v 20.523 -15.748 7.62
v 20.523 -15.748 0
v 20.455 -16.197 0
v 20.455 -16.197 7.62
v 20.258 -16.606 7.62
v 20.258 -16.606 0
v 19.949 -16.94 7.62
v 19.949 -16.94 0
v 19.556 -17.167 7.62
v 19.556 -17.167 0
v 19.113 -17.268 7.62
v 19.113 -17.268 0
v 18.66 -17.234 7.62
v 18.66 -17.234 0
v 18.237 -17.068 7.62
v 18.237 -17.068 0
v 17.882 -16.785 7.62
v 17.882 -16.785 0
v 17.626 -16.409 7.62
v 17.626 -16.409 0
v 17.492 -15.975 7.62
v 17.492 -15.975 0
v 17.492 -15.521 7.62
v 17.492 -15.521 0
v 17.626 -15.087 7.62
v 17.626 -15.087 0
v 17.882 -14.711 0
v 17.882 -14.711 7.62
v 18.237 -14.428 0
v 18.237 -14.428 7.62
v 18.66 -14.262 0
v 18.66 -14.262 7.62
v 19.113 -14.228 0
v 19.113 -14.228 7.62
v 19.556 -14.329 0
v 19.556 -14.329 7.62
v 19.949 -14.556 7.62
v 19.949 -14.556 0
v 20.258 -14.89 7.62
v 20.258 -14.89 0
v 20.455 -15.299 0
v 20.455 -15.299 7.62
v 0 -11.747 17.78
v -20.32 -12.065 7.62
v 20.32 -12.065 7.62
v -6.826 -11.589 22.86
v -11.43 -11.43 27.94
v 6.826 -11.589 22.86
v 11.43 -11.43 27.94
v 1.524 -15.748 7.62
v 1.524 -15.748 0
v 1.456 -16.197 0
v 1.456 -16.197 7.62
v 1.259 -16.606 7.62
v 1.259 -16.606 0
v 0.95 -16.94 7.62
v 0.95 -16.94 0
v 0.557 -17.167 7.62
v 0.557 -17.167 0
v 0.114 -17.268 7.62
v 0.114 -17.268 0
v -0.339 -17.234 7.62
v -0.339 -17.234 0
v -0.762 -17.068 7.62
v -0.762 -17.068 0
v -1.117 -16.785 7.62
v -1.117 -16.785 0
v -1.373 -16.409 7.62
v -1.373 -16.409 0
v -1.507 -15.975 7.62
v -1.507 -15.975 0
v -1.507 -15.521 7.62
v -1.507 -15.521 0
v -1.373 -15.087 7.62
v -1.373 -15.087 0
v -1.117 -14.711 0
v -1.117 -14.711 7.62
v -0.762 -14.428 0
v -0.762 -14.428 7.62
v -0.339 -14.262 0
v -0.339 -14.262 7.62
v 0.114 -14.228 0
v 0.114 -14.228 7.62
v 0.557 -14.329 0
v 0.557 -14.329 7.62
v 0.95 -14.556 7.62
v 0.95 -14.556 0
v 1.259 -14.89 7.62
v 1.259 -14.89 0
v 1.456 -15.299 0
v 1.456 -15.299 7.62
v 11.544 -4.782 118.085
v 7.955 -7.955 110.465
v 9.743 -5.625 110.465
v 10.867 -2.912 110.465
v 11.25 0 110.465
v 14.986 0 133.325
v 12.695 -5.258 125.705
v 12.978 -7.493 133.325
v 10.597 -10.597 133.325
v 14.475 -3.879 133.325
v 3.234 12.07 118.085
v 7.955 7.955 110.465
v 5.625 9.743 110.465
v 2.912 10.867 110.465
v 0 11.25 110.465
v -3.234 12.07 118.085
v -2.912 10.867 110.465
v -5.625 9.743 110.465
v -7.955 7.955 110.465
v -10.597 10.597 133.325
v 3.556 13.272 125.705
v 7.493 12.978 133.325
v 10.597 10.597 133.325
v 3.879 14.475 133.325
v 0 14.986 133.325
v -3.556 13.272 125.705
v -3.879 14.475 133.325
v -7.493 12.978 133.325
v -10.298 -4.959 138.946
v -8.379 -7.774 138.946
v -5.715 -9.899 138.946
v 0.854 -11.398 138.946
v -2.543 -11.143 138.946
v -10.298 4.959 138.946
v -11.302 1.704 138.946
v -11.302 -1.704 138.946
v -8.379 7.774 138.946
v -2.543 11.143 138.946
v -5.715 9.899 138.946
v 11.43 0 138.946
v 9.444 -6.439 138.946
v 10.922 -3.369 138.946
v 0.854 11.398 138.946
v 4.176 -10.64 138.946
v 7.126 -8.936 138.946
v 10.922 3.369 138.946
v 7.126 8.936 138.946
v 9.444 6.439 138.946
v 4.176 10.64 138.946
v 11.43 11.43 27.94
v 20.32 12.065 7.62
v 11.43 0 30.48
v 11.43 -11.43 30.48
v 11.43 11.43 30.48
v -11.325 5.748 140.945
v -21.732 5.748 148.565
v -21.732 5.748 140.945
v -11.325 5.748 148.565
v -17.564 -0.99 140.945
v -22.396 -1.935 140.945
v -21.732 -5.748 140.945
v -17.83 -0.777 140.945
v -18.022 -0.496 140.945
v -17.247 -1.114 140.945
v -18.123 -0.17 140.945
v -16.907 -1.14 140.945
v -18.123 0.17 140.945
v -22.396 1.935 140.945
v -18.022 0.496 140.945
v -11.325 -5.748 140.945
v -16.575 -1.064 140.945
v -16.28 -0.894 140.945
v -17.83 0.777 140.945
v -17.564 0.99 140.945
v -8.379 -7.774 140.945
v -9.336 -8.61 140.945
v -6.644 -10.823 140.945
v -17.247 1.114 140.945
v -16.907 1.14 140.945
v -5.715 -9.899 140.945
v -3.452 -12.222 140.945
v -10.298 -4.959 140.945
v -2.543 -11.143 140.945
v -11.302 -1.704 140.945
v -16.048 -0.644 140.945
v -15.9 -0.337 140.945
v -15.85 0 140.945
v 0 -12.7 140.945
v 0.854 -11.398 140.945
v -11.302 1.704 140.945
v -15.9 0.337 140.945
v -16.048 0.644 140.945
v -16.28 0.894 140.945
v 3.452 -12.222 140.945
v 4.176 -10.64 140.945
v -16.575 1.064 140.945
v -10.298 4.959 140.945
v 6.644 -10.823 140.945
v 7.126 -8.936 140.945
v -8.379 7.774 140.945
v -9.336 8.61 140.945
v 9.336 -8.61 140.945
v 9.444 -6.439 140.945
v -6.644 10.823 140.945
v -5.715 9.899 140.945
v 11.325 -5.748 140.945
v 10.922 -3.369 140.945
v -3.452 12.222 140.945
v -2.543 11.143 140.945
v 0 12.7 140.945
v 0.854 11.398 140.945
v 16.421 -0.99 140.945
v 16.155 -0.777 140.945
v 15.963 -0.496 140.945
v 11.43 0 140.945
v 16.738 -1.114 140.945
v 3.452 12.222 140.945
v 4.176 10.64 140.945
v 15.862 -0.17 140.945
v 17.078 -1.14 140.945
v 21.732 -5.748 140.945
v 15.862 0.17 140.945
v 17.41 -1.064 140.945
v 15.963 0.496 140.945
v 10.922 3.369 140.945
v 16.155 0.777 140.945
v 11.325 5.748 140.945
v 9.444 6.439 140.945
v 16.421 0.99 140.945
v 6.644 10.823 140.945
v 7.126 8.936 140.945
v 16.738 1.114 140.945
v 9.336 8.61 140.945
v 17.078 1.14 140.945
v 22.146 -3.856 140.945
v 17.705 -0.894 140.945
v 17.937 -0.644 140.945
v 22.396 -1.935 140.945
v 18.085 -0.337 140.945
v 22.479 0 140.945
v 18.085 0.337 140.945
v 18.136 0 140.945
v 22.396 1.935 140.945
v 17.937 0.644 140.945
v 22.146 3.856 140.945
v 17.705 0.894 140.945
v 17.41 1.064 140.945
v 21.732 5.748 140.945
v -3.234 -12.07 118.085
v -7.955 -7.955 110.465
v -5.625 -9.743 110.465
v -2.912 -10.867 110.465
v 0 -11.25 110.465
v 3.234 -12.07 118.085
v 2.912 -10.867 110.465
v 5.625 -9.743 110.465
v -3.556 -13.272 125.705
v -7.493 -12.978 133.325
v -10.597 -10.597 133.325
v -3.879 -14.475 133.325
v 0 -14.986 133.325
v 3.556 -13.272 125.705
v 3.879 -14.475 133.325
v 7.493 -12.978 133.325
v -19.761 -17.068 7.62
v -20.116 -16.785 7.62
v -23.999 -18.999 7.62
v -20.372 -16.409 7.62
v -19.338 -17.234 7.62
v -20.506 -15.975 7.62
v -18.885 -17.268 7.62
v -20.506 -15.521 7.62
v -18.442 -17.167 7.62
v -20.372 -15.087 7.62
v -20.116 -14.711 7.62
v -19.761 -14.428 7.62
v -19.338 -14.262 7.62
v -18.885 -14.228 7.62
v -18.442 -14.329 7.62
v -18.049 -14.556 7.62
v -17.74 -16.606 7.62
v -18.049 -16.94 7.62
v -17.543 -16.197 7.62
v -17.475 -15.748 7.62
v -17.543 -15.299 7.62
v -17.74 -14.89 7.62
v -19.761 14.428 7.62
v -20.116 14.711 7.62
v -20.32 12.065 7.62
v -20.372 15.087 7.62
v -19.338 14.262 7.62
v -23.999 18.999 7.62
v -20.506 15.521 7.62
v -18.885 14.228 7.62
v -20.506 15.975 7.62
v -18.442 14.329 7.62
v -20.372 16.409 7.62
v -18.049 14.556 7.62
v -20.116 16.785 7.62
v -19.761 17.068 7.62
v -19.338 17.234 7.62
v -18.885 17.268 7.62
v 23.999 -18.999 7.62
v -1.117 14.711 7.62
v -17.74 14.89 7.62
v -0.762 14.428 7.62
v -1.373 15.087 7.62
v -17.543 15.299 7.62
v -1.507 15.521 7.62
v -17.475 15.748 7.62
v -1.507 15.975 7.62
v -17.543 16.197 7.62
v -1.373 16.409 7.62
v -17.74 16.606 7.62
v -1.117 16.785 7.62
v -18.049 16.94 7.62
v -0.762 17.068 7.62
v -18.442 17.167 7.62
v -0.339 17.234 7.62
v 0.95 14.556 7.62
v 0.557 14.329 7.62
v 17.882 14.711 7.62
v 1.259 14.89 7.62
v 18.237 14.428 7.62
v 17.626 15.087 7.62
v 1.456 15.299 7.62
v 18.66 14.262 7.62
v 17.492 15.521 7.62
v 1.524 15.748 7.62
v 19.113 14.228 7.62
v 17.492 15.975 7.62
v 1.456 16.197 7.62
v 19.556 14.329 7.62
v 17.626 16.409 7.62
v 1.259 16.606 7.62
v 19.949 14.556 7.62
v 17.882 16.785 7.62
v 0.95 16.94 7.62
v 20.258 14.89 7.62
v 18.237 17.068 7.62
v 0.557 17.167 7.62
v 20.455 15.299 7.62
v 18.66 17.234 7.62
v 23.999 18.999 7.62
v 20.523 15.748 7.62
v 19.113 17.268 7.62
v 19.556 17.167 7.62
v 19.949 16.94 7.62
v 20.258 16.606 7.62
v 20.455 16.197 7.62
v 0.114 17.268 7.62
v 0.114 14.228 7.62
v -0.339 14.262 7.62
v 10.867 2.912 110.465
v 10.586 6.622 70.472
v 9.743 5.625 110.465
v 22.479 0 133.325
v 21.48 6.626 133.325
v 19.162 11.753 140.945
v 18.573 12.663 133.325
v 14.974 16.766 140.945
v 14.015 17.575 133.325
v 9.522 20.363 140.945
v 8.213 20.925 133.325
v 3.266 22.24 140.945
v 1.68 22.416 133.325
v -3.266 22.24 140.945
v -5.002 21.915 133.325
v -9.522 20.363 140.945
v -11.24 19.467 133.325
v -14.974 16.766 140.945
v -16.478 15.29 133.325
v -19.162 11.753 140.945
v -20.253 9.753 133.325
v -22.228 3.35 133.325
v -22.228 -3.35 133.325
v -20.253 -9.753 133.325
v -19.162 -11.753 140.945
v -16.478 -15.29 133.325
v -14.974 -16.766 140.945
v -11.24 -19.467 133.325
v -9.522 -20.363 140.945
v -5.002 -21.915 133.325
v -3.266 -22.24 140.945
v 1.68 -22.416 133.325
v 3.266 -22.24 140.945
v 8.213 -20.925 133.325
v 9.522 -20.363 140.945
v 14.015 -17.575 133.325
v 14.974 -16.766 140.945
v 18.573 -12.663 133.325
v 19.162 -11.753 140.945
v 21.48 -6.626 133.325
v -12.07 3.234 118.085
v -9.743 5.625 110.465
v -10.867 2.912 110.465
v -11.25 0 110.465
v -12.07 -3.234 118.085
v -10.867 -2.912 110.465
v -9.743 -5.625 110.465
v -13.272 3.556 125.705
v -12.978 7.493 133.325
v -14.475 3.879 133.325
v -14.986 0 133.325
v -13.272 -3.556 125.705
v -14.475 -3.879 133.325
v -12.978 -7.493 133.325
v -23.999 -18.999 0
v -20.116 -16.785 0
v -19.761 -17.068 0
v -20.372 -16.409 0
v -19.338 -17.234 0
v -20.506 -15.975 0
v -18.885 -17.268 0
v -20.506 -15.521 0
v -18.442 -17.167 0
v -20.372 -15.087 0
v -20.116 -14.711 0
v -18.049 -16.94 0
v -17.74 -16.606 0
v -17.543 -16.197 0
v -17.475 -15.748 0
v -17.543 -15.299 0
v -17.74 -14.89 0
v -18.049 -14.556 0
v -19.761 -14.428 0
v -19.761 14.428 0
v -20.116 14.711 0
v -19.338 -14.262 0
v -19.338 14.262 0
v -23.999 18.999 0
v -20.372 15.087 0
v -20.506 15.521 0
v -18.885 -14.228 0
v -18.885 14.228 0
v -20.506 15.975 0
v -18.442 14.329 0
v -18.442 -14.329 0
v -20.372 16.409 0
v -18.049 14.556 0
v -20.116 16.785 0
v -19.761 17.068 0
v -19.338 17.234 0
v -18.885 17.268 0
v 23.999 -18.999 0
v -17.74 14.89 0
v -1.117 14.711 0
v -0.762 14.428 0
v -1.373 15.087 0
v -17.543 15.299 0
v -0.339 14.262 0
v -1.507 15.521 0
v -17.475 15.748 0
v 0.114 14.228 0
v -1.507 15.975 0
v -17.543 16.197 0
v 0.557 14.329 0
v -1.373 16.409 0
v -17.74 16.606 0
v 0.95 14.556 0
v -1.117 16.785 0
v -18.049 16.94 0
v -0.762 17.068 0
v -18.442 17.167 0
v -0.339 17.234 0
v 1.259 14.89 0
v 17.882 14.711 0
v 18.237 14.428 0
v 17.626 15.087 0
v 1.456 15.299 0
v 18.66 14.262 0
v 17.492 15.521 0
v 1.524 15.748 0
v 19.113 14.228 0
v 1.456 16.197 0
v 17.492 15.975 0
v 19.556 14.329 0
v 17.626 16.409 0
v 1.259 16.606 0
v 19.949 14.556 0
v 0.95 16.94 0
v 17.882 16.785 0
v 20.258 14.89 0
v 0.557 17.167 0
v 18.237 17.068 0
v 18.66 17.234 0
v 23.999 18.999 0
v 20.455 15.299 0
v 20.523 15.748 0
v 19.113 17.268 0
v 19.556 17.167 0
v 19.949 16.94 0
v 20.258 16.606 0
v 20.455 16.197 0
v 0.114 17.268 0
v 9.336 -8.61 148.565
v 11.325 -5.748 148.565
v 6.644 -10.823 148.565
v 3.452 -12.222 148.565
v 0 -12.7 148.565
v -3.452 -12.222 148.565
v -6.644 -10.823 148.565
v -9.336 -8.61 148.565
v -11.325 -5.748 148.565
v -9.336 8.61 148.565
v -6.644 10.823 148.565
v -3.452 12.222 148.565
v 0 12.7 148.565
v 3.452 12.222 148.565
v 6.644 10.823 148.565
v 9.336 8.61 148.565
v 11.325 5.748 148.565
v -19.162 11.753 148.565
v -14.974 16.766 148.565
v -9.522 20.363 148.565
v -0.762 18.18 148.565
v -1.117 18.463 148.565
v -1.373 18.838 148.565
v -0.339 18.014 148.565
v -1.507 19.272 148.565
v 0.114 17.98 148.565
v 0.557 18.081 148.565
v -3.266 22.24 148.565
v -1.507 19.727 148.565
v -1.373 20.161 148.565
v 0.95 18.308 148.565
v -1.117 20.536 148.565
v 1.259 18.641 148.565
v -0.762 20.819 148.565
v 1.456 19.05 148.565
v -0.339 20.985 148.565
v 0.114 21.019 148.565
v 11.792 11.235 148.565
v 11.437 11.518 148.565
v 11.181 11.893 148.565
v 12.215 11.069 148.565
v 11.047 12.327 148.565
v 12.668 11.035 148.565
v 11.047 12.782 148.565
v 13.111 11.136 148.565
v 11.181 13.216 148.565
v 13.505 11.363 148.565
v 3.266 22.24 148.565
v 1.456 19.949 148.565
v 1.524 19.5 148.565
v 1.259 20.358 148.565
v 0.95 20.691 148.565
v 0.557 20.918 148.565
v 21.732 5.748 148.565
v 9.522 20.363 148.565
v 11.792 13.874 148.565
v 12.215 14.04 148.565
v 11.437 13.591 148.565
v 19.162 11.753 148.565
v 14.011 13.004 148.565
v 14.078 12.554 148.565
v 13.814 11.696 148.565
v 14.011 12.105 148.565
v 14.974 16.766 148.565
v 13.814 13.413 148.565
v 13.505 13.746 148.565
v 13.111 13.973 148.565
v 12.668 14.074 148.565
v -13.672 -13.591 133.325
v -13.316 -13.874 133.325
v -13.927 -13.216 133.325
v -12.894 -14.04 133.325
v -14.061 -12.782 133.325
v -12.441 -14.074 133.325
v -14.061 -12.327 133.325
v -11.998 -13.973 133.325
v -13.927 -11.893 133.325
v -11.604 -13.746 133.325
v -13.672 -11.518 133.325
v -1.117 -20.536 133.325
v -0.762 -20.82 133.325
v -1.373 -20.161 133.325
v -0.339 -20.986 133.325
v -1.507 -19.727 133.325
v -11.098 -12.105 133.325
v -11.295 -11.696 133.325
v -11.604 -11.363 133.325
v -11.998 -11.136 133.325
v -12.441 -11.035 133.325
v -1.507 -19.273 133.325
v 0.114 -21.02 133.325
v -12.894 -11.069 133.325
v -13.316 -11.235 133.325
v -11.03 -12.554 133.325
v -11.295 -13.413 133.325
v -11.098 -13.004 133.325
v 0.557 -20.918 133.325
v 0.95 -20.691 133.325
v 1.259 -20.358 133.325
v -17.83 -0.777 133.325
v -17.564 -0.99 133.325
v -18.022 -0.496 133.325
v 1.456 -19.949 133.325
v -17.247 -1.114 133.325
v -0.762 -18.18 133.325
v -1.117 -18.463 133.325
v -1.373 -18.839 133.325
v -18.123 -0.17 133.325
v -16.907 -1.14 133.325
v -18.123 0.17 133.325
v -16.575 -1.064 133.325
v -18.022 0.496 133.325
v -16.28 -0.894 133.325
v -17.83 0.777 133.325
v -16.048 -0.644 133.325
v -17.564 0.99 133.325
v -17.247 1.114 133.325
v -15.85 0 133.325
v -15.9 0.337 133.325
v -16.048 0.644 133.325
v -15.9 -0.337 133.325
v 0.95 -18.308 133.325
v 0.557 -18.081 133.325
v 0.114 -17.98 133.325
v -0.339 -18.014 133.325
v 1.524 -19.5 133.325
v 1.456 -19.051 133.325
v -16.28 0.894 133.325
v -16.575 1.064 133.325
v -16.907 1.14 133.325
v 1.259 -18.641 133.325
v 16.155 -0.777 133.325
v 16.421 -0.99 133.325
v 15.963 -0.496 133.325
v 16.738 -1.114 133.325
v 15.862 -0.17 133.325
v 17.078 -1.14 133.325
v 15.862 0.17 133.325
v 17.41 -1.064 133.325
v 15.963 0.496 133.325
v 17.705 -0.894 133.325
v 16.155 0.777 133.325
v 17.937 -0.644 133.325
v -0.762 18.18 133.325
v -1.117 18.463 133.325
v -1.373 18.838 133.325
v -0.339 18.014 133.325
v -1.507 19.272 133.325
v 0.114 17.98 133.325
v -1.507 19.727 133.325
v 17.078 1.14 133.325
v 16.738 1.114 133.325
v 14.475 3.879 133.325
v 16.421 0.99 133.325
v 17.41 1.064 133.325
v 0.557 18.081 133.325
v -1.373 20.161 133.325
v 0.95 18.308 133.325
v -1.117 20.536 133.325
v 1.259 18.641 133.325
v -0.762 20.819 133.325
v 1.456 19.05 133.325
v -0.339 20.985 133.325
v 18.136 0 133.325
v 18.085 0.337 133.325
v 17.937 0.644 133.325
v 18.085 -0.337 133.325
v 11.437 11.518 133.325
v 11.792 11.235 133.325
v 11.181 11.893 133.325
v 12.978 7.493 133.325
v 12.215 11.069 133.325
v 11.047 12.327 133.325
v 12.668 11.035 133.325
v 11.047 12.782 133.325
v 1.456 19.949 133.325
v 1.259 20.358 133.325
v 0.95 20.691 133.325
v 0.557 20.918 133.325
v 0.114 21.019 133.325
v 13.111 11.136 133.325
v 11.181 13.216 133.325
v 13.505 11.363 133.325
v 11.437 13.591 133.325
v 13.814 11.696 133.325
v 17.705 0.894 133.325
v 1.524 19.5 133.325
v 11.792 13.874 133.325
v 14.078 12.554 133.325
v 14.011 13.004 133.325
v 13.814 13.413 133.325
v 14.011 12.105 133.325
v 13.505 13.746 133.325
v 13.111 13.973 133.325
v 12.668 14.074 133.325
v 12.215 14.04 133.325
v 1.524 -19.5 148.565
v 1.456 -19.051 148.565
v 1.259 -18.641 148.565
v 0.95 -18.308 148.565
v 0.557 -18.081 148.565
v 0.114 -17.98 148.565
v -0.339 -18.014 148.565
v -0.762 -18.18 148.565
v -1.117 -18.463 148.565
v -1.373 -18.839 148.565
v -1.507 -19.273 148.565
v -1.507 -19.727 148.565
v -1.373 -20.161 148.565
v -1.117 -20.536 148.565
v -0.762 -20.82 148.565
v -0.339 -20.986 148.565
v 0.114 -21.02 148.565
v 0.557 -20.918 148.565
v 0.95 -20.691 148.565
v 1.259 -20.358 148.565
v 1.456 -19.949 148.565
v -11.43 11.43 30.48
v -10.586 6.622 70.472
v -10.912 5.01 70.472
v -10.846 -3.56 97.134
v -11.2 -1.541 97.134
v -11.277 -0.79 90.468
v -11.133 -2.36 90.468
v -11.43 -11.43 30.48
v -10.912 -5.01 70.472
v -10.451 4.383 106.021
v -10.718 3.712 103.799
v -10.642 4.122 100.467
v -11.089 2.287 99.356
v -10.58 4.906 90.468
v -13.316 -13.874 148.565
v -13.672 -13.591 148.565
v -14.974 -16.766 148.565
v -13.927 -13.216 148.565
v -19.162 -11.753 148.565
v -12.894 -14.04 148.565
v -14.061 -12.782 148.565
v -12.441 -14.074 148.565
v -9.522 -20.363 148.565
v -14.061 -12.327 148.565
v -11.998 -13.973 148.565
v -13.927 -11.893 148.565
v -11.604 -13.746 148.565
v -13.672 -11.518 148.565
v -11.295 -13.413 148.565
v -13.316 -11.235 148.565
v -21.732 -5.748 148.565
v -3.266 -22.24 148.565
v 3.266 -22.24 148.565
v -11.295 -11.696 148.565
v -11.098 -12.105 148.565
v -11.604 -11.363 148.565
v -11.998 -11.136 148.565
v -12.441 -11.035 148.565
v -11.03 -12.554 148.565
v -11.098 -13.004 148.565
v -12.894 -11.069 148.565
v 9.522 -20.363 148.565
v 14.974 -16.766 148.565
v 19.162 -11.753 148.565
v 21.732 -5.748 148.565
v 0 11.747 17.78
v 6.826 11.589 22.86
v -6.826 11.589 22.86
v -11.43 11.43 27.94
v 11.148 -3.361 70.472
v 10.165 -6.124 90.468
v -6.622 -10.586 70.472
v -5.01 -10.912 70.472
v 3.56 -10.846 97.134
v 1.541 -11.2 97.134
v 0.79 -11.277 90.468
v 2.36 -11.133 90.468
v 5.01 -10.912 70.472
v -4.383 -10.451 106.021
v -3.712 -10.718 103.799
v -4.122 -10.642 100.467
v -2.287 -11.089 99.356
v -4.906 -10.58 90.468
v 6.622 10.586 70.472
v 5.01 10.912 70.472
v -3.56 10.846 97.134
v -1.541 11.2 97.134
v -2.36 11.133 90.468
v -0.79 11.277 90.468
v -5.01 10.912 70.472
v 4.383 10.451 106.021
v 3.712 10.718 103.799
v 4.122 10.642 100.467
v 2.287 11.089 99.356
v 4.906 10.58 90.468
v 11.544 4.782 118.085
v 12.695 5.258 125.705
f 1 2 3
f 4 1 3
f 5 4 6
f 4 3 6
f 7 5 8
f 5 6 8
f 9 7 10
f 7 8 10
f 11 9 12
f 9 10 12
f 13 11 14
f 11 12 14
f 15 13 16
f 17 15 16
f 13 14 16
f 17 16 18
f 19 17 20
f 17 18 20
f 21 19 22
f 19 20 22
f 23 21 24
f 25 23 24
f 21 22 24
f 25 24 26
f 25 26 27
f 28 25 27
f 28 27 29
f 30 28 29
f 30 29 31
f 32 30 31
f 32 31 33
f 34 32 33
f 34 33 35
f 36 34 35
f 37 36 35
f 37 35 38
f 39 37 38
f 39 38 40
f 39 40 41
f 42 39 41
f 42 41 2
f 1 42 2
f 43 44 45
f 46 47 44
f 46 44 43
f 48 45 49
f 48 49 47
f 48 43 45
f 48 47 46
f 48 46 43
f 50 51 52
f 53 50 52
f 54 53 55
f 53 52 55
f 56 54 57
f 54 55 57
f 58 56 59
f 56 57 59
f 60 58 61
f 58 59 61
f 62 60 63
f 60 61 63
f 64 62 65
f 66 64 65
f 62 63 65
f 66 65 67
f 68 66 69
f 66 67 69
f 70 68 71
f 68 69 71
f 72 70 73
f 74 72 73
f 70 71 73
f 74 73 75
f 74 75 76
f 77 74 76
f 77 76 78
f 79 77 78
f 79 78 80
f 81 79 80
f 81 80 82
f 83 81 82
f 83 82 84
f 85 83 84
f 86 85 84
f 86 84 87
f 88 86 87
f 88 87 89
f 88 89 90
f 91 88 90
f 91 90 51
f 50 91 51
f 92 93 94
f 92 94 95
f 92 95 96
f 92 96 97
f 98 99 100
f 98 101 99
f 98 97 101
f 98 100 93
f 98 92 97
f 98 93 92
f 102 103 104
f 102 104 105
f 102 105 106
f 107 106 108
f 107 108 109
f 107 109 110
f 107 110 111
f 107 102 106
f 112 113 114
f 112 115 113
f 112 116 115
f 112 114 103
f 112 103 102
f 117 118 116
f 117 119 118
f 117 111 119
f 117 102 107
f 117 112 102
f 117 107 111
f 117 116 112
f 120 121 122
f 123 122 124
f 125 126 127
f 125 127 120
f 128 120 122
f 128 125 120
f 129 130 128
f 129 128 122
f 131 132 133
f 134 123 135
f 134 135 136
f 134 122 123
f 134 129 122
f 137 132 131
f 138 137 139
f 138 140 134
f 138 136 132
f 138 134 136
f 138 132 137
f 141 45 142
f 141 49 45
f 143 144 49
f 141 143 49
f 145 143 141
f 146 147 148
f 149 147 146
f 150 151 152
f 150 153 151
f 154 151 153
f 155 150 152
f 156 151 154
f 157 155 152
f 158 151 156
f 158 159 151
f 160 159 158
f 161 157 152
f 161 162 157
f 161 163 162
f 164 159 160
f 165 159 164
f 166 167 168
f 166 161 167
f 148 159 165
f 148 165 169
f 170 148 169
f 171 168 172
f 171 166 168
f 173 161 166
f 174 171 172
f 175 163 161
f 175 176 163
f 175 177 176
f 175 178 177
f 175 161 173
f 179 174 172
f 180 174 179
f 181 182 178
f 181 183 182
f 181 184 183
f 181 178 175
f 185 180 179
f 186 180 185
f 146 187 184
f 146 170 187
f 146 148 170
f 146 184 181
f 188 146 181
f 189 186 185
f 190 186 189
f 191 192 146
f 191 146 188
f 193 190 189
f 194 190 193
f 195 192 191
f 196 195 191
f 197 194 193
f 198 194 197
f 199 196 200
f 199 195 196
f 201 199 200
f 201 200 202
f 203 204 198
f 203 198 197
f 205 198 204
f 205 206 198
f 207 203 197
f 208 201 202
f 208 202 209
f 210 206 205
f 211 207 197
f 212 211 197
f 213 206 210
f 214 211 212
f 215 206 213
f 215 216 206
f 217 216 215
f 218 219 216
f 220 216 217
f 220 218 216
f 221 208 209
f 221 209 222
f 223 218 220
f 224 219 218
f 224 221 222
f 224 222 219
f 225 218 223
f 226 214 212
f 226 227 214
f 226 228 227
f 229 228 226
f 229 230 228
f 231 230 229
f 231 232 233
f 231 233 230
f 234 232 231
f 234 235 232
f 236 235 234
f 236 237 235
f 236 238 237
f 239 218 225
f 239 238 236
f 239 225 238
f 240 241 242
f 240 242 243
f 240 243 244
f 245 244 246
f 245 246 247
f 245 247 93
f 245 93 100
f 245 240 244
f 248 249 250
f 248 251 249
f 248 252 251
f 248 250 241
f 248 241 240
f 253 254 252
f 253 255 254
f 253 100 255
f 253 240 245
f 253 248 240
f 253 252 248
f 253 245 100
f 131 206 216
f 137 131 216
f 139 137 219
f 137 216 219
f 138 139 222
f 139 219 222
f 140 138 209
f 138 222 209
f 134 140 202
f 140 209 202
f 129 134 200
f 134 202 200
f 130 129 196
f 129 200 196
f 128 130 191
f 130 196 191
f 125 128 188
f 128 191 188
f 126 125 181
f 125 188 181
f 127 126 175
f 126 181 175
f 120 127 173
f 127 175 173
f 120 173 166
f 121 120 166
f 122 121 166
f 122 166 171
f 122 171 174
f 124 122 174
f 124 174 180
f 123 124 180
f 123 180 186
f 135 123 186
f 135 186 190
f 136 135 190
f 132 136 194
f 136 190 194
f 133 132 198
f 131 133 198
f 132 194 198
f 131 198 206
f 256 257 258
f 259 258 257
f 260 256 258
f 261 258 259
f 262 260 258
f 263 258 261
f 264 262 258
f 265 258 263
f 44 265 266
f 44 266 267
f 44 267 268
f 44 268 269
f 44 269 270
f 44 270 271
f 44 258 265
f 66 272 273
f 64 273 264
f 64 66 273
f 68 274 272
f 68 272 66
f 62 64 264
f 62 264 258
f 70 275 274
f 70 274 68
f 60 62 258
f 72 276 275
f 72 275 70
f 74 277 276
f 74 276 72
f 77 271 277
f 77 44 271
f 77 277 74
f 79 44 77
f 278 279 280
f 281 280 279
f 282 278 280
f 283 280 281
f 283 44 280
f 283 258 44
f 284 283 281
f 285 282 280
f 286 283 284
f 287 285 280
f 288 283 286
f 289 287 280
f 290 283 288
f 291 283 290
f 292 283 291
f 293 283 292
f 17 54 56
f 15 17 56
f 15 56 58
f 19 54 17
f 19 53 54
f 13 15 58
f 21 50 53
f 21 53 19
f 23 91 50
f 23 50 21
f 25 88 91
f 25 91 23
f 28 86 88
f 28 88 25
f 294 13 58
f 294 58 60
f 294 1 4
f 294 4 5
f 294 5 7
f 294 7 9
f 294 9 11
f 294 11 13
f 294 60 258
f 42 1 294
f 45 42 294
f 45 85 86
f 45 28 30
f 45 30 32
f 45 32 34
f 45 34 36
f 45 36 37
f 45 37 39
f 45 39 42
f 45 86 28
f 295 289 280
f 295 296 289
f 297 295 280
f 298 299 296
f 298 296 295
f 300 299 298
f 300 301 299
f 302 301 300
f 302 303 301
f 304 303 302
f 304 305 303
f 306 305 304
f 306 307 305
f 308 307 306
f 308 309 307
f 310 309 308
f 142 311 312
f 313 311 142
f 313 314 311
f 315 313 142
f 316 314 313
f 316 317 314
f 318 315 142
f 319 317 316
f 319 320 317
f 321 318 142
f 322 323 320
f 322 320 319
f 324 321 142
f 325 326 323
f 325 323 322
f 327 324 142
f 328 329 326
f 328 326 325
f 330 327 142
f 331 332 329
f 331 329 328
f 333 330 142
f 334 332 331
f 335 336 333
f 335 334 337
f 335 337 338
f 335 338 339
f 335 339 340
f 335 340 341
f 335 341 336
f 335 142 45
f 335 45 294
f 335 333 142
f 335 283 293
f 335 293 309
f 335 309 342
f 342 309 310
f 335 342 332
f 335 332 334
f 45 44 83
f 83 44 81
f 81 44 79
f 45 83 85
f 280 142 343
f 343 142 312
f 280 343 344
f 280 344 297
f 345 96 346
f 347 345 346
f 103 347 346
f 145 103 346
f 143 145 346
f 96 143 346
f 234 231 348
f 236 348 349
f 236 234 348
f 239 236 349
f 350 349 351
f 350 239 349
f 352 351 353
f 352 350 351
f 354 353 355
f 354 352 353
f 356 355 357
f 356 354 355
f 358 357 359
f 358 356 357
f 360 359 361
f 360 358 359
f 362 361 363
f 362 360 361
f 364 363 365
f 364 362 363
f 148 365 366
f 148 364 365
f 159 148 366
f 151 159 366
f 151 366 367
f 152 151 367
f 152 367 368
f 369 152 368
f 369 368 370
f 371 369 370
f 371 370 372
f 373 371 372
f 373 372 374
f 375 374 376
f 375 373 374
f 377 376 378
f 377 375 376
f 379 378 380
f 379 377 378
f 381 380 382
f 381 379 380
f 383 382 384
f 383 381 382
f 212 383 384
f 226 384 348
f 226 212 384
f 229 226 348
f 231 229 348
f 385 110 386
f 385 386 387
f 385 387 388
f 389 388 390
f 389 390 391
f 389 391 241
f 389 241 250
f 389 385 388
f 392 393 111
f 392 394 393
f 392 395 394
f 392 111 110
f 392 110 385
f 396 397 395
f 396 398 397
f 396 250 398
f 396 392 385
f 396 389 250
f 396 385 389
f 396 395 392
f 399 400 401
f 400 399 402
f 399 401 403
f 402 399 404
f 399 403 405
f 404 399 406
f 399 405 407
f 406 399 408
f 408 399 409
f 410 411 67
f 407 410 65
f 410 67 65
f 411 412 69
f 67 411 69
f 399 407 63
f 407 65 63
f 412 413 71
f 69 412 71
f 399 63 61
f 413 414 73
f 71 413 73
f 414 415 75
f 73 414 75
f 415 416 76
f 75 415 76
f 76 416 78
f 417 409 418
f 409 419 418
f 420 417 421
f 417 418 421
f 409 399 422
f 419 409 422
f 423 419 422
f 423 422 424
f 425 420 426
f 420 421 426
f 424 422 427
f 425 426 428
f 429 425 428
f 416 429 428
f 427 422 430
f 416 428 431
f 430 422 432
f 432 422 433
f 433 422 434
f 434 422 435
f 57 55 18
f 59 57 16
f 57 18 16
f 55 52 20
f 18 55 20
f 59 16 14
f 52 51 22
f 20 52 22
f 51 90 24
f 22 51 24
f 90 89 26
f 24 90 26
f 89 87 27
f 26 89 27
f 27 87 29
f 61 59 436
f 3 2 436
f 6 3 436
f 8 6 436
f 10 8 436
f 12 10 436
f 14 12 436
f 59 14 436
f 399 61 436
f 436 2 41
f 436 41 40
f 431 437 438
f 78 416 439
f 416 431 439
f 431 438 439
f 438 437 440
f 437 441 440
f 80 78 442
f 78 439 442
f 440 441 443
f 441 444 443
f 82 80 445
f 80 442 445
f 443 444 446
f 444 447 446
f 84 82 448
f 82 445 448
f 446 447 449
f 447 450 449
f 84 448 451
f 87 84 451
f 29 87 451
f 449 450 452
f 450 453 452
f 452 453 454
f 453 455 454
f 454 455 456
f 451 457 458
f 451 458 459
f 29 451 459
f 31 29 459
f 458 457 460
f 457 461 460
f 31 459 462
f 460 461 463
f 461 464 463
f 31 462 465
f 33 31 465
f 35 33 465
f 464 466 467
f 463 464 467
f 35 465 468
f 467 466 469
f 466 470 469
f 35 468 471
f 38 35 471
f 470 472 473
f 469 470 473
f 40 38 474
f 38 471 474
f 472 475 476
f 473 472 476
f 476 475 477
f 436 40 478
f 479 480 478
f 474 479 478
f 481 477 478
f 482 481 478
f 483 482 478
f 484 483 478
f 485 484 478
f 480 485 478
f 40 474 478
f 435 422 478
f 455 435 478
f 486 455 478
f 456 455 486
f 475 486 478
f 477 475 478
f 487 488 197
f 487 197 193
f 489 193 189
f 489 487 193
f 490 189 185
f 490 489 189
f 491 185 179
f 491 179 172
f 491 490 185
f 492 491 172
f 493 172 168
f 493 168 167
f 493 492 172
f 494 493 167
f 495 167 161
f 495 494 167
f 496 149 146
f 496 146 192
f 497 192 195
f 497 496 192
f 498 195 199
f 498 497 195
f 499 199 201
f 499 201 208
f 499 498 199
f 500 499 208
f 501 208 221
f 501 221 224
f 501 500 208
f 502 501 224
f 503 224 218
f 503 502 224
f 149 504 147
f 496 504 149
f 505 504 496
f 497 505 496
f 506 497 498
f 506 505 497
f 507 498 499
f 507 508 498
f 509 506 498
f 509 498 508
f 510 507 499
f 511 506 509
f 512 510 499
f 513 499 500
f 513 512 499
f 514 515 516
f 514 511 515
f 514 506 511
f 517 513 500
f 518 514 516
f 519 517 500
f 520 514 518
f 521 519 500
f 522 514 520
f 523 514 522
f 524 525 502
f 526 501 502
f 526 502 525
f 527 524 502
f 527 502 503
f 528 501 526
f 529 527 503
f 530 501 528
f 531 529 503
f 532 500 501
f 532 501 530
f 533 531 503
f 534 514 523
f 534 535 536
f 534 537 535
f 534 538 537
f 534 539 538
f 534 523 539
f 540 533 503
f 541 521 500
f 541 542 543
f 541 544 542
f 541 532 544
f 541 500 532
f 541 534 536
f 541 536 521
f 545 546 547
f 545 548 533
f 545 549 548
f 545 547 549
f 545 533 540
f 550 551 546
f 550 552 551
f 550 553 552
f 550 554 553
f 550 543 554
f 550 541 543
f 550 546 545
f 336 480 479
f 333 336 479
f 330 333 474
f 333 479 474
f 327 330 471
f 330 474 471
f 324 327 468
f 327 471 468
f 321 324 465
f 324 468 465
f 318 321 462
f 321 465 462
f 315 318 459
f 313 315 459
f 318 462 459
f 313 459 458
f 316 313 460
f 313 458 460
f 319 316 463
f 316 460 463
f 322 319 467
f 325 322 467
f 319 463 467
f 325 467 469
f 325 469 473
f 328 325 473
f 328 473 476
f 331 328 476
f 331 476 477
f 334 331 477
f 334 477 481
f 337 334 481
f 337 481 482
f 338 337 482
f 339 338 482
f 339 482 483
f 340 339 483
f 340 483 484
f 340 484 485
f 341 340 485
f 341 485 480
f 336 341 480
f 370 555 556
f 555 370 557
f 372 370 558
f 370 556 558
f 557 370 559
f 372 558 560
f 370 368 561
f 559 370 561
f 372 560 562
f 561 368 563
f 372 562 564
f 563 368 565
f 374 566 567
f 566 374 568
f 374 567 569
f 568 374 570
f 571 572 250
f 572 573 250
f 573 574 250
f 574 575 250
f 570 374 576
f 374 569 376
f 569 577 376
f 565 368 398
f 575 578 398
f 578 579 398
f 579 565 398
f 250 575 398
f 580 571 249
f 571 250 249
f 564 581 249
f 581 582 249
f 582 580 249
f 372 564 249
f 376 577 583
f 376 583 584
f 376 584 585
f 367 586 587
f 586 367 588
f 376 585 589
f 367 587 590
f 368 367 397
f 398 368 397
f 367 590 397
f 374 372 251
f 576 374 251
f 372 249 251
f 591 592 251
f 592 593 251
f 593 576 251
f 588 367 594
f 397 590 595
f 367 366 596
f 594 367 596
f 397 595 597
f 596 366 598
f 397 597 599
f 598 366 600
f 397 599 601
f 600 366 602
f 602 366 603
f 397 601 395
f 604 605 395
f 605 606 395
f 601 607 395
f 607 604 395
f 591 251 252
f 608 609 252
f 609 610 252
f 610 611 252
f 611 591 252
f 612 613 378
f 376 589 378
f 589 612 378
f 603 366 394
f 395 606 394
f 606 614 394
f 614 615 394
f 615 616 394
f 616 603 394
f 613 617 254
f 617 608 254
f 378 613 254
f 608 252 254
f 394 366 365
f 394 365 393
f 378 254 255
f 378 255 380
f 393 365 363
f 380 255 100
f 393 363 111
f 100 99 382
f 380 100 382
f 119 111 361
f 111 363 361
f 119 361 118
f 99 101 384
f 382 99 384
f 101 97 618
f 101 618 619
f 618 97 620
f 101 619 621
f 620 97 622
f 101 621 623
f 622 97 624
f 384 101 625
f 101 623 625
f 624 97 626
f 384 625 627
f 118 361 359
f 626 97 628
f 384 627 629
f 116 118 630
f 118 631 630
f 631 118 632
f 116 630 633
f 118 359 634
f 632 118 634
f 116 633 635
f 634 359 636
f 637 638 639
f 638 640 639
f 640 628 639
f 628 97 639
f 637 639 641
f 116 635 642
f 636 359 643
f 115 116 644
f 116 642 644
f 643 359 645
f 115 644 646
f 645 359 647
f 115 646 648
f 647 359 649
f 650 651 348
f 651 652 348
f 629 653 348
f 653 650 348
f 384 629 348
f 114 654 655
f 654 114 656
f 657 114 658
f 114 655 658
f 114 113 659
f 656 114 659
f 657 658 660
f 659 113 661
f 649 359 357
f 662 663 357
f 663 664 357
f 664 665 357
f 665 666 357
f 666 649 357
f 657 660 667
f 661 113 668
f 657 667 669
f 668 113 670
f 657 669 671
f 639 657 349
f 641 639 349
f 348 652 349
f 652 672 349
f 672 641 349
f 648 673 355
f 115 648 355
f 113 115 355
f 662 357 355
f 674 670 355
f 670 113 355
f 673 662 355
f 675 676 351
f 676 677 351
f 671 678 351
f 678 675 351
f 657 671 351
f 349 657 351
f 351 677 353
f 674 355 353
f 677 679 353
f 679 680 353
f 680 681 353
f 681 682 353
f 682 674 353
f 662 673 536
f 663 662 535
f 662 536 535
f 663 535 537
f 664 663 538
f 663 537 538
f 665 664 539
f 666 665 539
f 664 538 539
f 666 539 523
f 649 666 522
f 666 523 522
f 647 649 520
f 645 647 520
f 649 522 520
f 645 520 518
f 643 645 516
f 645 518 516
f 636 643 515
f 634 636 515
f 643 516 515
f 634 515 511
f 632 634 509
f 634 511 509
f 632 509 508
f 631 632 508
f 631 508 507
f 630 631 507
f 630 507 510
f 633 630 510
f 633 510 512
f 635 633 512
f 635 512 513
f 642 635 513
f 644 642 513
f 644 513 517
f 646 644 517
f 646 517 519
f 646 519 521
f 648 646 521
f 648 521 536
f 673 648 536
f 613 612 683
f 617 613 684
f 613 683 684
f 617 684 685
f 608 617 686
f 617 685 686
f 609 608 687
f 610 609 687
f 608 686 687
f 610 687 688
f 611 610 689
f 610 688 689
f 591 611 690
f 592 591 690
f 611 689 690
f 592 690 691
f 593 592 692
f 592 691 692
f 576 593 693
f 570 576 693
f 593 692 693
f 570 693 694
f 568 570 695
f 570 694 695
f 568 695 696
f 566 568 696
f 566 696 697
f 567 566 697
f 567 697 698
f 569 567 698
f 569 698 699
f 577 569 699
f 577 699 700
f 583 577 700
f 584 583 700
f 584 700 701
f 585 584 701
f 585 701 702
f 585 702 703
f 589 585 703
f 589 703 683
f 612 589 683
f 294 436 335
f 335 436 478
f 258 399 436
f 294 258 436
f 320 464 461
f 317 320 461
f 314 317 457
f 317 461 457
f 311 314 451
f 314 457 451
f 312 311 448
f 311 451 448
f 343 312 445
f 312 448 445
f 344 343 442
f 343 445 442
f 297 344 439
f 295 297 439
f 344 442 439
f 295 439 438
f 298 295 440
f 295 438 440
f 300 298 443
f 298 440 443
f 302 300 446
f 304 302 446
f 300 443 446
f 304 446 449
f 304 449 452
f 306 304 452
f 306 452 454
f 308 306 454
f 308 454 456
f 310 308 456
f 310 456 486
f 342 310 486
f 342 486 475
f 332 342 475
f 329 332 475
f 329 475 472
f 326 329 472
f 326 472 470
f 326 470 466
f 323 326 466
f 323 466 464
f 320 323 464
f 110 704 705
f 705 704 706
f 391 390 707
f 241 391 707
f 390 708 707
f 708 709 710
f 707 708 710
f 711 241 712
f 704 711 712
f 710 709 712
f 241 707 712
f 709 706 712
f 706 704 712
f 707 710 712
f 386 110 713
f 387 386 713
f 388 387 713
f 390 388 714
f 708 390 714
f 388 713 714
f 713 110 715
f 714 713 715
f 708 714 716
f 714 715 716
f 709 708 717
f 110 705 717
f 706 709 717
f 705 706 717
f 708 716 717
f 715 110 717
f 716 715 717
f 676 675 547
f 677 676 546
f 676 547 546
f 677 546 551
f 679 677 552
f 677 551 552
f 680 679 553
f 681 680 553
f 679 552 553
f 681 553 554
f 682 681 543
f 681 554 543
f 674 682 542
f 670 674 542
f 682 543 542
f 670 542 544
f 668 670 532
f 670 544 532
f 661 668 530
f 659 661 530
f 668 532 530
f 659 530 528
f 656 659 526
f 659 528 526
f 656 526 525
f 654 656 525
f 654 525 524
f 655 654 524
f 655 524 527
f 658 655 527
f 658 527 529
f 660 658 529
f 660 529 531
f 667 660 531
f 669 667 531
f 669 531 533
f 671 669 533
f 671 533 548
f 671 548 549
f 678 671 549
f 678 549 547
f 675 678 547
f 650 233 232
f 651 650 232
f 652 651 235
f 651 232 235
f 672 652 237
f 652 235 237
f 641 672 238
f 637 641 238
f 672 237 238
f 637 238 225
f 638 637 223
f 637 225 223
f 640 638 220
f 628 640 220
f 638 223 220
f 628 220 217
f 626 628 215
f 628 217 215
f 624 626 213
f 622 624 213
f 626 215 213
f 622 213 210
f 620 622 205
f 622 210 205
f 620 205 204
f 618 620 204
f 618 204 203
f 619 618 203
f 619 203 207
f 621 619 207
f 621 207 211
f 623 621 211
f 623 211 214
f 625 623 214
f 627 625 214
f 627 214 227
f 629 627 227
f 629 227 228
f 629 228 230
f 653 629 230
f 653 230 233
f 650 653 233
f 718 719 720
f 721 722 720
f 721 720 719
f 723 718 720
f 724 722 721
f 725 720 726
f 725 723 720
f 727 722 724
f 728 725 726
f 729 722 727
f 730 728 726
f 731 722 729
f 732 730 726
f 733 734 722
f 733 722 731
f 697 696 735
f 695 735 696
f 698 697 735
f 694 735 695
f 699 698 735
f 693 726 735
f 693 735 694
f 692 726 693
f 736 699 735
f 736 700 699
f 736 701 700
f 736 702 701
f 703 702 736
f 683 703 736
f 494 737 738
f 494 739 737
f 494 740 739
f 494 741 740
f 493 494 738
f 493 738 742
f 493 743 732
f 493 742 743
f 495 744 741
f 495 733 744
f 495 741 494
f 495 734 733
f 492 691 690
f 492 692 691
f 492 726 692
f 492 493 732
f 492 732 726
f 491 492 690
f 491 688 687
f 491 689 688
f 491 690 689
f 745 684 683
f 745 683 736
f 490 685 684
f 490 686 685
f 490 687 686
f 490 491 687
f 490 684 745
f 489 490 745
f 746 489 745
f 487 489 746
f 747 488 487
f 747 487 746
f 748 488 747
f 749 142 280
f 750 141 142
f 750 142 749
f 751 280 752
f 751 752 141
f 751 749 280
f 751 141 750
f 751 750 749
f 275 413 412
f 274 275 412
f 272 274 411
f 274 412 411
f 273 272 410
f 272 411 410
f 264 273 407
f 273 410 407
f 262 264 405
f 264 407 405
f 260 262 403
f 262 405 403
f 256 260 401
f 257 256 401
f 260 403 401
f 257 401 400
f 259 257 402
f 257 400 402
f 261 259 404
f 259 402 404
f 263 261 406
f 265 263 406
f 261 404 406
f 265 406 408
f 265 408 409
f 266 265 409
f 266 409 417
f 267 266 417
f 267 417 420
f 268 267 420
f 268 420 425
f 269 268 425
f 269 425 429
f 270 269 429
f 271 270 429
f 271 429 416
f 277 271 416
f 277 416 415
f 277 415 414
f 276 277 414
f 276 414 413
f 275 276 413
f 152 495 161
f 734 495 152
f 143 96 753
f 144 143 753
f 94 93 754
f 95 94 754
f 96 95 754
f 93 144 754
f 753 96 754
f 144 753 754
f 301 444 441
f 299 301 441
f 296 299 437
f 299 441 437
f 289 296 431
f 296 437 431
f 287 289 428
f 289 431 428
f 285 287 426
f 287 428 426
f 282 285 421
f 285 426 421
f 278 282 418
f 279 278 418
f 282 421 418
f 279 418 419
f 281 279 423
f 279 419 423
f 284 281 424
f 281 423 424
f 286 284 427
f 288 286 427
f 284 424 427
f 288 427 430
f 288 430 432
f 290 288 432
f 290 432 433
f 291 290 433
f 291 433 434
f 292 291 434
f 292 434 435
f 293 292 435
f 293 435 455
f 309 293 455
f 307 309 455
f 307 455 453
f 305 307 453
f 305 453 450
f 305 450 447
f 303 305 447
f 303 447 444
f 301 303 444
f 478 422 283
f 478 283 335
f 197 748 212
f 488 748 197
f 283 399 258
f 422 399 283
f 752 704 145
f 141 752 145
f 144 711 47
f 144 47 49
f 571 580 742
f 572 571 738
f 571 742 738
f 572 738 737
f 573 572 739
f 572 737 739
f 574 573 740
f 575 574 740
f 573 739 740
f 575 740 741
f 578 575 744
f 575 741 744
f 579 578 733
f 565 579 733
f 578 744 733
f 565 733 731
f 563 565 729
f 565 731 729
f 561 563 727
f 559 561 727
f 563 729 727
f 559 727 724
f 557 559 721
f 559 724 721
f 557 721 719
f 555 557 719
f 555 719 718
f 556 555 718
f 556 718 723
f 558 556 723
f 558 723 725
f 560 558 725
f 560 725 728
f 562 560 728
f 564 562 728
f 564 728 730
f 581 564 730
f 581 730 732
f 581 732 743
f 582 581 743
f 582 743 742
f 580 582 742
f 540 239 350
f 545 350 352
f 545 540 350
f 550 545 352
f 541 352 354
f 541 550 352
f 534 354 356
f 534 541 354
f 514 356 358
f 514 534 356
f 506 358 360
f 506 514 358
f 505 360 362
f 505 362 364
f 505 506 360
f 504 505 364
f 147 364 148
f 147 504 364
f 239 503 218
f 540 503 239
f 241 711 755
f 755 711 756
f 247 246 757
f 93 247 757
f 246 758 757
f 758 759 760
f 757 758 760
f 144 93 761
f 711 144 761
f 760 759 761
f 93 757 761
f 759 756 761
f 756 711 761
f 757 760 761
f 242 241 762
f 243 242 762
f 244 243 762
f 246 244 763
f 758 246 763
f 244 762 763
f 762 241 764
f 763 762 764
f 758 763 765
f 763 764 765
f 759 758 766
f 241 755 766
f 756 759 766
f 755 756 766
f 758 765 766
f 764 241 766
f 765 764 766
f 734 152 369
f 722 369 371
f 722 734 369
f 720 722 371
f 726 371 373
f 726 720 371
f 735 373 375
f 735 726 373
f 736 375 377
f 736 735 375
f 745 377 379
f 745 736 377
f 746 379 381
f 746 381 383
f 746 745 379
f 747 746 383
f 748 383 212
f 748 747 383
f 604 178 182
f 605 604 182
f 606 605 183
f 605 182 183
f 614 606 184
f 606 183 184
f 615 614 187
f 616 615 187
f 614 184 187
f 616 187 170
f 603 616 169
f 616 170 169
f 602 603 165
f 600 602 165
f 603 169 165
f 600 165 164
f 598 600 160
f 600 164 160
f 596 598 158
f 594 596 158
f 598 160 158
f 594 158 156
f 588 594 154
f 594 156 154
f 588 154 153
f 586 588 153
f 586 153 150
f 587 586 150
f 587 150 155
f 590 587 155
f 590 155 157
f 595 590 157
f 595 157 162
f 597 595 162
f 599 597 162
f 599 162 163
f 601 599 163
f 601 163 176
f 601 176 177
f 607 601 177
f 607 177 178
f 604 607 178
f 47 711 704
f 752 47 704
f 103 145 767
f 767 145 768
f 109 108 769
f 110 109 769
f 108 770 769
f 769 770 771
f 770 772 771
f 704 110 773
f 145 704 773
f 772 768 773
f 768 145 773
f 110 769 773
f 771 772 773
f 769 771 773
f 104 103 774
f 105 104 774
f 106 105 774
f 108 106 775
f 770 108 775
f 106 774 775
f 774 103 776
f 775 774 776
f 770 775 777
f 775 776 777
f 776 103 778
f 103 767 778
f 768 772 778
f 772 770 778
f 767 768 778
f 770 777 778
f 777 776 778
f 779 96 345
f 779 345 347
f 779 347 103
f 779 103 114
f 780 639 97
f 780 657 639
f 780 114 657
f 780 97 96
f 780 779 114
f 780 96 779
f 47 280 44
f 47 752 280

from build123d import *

# Parameters (mm, degrees)
F2_W        = 22.86
F2_H        = 22.86
F2_R        = 11.24966
F11_DEPTH   = 2.54
F6_W        = 40.64
F6_H        = 24.13
F11_FACE_W  = 22.86
F11_FACE_H  = 22.86
F4_R        = 11.249914
F11_FACE1_W = 22.86
F11_FACE1_H = 22.86
F0_W        = 47.99838
F0_H        = 37.9984
F14_DEPTH   = 7.62
F16_R       = 14.986
F10_R       = 22.479
F10_R_2     = 14.986
F18_DEPTH   = 7.62
F19_DEPTH   = 7.62
F21_R       = 1.524
F22_DEPTH   = 25.4
F23_R       = 1.524
F24_DEPTH   = 25.4
F20_R       = 1.143
F25_DEPTH   = 25.4
F26_R       = 11.43
F27_DEPTH   = 1.99898


with BuildPart() as f11:
    # F2 (on offset) → F11 (new body)
    with BuildSketch(Plane.XY.offset(30.48)):
        Rectangle(F2_W, F2_H)
        Circle(F2_R, mode=Mode.SUBTRACT)
        Circle(F2_R)
    extrude(amount=-F11_DEPTH)

    # F6 (on offset) → F12 section 0
    with BuildSketch(Plane.XY.offset(7.62)):
        Rectangle(F6_W, F6_H)
    # F11_face (on face) → F12 section 1
    with BuildSketch(Plane(origin=(0, 0, 27.94), x_dir=(1, 0, 0), z_dir=(0, 0, -1))):
        Rectangle(F11_FACE_W, F11_FACE_H)
    loft()

    # F4 (on offset) → F13 section 0
    with BuildSketch(Plane.XY.offset(110.4646)):
        Circle(F4_R)
    # F11_face1 (on face) → F13 section 1
    with BuildSketch(Plane.XY.offset(30.48)):
        Rectangle(F11_FACE1_W, F11_FACE1_H)
    loft()

    # F0 (on Top) → F14 (join, through all)
    with BuildSketch(Plane.XY):
        Rectangle(F0_W, F0_H)
    extrude(amount=F14_DEPTH)

    # F13_face (on face) → F17 section 0
    with BuildSketch(Plane.XY.offset(110.4646)):
        with BuildLine():
            ThreePointArc((11.249914, 0), (10.3935652871, 4.3051557033), (7.9548904772, 7.9548904772))
            ThreePointArc((7.9548904772, 7.9548904772), (0, 11.249914), (-7.9548904772, 7.9548904772))
            ThreePointArc((-7.9548904772, 7.9548904772), (-11.249914, 0), (-7.9548904772, -7.9548904772))
            ThreePointArc((-7.9548904772, -7.9548904772), (0, -11.249914), (7.9548904772, -7.9548904772))
            ThreePointArc((7.9548904772, -7.9548904772), (10.3935652871, -4.3051557033), (11.249914, 0))
        make_face()
    # F16 (on offset) → F17 section 1
    with BuildSketch(Plane.XY.offset(133.3246)):
        Circle(F16_R)
    loft()

    # F10 (on offset) → F18 (join, through all)
    with BuildSketch(Plane.XY.offset(140.9446)):
        Circle(F10_R)
        Circle(F10_R_2, mode=Mode.SUBTRACT)
        Circle(F10_R_2)
    extrude(amount=-F18_DEPTH)

    # F8 (on offset) → F19 (join, through all)
    with BuildSketch(Plane.XY.offset(148.5646)):
        with BuildLine():
            ThreePointArc((-21.7316752019, -5.74802), (0, -22.479), (21.7316752019, -5.74802))
            Line((21.7316752019, -5.74802), (11.3247634006, -5.74802))
            ThreePointArc((11.3247634006, -5.74802), (0, -12.7), (-11.3247634006, -5.74802))
            Line((-11.3247634006, -5.74802), (-21.7316752019, -5.74802))
        make_face()
        with BuildLine():
            Line((11.3247634006, 5.74802), (21.7316752019, 5.74802))
            ThreePointArc((21.7316752019, 5.74802), (0, 22.479), (-21.7316752019, 5.74802))
            Line((-21.7316752019, 5.74802), (-11.3247634006, 5.74802))
            ThreePointArc((-11.3247634006, 5.74802), (0, 12.7), (11.3247634006, 5.74802))
        make_face()
    extrude(amount=-F19_DEPTH)

    # F21 (on face) → F22 (cut)
    with BuildSketch(Plane(origin=(0, 0, 0), x_dir=(1, 0, 0), z_dir=(0, 0, -1))):
        with Locations((-18.9992, 15.748)):
            Circle(F21_R)
        with Locations((0, 15.748)):
            Circle(F21_R)
        with Locations((18.9992, 15.748)):
            Circle(F21_R)
        with Locations((-18.9992, -15.748)):
            Circle(F21_R)
        with Locations((0, -15.748)):
            Circle(F21_R)
        with Locations((18.9992, -15.748)):
            Circle(F21_R)
    extrude(amount=-F22_DEPTH, mode=Mode.SUBTRACT)

    # F23 (on face) → F24 (cut)
    with BuildSketch(Plane.XY.offset(148.5646)):
        with Locations((0, 19.49958)):
            Circle(F23_R)
        with Locations((12.5543980573, 12.5543980573)):
            Circle(F23_R)
        with Locations((0, -19.499834)):
            Circle(F23_R)
        with Locations((-12.5543980573, -12.5543980573)):
            Circle(F23_R)
    extrude(amount=-F24_DEPTH, mode=Mode.SUBTRACT)

    # F20 (on face) → F25 (cut)
    with BuildSketch(Plane.XY.offset(140.9446)):
        with Locations((16.9926, 0)):
            Circle(F20_R)
        with Locations((-16.9926, 0)):
            Circle(F20_R)
    extrude(amount=-F25_DEPTH, mode=Mode.SUBTRACT)

    # F26 (on face) → F27 (cut)
    with BuildSketch(Plane.XY.offset(140.9446)):
        Circle(F26_R)
    extrude(amount=-F27_DEPTH, mode=Mode.SUBTRACT)


solid = f11.part
